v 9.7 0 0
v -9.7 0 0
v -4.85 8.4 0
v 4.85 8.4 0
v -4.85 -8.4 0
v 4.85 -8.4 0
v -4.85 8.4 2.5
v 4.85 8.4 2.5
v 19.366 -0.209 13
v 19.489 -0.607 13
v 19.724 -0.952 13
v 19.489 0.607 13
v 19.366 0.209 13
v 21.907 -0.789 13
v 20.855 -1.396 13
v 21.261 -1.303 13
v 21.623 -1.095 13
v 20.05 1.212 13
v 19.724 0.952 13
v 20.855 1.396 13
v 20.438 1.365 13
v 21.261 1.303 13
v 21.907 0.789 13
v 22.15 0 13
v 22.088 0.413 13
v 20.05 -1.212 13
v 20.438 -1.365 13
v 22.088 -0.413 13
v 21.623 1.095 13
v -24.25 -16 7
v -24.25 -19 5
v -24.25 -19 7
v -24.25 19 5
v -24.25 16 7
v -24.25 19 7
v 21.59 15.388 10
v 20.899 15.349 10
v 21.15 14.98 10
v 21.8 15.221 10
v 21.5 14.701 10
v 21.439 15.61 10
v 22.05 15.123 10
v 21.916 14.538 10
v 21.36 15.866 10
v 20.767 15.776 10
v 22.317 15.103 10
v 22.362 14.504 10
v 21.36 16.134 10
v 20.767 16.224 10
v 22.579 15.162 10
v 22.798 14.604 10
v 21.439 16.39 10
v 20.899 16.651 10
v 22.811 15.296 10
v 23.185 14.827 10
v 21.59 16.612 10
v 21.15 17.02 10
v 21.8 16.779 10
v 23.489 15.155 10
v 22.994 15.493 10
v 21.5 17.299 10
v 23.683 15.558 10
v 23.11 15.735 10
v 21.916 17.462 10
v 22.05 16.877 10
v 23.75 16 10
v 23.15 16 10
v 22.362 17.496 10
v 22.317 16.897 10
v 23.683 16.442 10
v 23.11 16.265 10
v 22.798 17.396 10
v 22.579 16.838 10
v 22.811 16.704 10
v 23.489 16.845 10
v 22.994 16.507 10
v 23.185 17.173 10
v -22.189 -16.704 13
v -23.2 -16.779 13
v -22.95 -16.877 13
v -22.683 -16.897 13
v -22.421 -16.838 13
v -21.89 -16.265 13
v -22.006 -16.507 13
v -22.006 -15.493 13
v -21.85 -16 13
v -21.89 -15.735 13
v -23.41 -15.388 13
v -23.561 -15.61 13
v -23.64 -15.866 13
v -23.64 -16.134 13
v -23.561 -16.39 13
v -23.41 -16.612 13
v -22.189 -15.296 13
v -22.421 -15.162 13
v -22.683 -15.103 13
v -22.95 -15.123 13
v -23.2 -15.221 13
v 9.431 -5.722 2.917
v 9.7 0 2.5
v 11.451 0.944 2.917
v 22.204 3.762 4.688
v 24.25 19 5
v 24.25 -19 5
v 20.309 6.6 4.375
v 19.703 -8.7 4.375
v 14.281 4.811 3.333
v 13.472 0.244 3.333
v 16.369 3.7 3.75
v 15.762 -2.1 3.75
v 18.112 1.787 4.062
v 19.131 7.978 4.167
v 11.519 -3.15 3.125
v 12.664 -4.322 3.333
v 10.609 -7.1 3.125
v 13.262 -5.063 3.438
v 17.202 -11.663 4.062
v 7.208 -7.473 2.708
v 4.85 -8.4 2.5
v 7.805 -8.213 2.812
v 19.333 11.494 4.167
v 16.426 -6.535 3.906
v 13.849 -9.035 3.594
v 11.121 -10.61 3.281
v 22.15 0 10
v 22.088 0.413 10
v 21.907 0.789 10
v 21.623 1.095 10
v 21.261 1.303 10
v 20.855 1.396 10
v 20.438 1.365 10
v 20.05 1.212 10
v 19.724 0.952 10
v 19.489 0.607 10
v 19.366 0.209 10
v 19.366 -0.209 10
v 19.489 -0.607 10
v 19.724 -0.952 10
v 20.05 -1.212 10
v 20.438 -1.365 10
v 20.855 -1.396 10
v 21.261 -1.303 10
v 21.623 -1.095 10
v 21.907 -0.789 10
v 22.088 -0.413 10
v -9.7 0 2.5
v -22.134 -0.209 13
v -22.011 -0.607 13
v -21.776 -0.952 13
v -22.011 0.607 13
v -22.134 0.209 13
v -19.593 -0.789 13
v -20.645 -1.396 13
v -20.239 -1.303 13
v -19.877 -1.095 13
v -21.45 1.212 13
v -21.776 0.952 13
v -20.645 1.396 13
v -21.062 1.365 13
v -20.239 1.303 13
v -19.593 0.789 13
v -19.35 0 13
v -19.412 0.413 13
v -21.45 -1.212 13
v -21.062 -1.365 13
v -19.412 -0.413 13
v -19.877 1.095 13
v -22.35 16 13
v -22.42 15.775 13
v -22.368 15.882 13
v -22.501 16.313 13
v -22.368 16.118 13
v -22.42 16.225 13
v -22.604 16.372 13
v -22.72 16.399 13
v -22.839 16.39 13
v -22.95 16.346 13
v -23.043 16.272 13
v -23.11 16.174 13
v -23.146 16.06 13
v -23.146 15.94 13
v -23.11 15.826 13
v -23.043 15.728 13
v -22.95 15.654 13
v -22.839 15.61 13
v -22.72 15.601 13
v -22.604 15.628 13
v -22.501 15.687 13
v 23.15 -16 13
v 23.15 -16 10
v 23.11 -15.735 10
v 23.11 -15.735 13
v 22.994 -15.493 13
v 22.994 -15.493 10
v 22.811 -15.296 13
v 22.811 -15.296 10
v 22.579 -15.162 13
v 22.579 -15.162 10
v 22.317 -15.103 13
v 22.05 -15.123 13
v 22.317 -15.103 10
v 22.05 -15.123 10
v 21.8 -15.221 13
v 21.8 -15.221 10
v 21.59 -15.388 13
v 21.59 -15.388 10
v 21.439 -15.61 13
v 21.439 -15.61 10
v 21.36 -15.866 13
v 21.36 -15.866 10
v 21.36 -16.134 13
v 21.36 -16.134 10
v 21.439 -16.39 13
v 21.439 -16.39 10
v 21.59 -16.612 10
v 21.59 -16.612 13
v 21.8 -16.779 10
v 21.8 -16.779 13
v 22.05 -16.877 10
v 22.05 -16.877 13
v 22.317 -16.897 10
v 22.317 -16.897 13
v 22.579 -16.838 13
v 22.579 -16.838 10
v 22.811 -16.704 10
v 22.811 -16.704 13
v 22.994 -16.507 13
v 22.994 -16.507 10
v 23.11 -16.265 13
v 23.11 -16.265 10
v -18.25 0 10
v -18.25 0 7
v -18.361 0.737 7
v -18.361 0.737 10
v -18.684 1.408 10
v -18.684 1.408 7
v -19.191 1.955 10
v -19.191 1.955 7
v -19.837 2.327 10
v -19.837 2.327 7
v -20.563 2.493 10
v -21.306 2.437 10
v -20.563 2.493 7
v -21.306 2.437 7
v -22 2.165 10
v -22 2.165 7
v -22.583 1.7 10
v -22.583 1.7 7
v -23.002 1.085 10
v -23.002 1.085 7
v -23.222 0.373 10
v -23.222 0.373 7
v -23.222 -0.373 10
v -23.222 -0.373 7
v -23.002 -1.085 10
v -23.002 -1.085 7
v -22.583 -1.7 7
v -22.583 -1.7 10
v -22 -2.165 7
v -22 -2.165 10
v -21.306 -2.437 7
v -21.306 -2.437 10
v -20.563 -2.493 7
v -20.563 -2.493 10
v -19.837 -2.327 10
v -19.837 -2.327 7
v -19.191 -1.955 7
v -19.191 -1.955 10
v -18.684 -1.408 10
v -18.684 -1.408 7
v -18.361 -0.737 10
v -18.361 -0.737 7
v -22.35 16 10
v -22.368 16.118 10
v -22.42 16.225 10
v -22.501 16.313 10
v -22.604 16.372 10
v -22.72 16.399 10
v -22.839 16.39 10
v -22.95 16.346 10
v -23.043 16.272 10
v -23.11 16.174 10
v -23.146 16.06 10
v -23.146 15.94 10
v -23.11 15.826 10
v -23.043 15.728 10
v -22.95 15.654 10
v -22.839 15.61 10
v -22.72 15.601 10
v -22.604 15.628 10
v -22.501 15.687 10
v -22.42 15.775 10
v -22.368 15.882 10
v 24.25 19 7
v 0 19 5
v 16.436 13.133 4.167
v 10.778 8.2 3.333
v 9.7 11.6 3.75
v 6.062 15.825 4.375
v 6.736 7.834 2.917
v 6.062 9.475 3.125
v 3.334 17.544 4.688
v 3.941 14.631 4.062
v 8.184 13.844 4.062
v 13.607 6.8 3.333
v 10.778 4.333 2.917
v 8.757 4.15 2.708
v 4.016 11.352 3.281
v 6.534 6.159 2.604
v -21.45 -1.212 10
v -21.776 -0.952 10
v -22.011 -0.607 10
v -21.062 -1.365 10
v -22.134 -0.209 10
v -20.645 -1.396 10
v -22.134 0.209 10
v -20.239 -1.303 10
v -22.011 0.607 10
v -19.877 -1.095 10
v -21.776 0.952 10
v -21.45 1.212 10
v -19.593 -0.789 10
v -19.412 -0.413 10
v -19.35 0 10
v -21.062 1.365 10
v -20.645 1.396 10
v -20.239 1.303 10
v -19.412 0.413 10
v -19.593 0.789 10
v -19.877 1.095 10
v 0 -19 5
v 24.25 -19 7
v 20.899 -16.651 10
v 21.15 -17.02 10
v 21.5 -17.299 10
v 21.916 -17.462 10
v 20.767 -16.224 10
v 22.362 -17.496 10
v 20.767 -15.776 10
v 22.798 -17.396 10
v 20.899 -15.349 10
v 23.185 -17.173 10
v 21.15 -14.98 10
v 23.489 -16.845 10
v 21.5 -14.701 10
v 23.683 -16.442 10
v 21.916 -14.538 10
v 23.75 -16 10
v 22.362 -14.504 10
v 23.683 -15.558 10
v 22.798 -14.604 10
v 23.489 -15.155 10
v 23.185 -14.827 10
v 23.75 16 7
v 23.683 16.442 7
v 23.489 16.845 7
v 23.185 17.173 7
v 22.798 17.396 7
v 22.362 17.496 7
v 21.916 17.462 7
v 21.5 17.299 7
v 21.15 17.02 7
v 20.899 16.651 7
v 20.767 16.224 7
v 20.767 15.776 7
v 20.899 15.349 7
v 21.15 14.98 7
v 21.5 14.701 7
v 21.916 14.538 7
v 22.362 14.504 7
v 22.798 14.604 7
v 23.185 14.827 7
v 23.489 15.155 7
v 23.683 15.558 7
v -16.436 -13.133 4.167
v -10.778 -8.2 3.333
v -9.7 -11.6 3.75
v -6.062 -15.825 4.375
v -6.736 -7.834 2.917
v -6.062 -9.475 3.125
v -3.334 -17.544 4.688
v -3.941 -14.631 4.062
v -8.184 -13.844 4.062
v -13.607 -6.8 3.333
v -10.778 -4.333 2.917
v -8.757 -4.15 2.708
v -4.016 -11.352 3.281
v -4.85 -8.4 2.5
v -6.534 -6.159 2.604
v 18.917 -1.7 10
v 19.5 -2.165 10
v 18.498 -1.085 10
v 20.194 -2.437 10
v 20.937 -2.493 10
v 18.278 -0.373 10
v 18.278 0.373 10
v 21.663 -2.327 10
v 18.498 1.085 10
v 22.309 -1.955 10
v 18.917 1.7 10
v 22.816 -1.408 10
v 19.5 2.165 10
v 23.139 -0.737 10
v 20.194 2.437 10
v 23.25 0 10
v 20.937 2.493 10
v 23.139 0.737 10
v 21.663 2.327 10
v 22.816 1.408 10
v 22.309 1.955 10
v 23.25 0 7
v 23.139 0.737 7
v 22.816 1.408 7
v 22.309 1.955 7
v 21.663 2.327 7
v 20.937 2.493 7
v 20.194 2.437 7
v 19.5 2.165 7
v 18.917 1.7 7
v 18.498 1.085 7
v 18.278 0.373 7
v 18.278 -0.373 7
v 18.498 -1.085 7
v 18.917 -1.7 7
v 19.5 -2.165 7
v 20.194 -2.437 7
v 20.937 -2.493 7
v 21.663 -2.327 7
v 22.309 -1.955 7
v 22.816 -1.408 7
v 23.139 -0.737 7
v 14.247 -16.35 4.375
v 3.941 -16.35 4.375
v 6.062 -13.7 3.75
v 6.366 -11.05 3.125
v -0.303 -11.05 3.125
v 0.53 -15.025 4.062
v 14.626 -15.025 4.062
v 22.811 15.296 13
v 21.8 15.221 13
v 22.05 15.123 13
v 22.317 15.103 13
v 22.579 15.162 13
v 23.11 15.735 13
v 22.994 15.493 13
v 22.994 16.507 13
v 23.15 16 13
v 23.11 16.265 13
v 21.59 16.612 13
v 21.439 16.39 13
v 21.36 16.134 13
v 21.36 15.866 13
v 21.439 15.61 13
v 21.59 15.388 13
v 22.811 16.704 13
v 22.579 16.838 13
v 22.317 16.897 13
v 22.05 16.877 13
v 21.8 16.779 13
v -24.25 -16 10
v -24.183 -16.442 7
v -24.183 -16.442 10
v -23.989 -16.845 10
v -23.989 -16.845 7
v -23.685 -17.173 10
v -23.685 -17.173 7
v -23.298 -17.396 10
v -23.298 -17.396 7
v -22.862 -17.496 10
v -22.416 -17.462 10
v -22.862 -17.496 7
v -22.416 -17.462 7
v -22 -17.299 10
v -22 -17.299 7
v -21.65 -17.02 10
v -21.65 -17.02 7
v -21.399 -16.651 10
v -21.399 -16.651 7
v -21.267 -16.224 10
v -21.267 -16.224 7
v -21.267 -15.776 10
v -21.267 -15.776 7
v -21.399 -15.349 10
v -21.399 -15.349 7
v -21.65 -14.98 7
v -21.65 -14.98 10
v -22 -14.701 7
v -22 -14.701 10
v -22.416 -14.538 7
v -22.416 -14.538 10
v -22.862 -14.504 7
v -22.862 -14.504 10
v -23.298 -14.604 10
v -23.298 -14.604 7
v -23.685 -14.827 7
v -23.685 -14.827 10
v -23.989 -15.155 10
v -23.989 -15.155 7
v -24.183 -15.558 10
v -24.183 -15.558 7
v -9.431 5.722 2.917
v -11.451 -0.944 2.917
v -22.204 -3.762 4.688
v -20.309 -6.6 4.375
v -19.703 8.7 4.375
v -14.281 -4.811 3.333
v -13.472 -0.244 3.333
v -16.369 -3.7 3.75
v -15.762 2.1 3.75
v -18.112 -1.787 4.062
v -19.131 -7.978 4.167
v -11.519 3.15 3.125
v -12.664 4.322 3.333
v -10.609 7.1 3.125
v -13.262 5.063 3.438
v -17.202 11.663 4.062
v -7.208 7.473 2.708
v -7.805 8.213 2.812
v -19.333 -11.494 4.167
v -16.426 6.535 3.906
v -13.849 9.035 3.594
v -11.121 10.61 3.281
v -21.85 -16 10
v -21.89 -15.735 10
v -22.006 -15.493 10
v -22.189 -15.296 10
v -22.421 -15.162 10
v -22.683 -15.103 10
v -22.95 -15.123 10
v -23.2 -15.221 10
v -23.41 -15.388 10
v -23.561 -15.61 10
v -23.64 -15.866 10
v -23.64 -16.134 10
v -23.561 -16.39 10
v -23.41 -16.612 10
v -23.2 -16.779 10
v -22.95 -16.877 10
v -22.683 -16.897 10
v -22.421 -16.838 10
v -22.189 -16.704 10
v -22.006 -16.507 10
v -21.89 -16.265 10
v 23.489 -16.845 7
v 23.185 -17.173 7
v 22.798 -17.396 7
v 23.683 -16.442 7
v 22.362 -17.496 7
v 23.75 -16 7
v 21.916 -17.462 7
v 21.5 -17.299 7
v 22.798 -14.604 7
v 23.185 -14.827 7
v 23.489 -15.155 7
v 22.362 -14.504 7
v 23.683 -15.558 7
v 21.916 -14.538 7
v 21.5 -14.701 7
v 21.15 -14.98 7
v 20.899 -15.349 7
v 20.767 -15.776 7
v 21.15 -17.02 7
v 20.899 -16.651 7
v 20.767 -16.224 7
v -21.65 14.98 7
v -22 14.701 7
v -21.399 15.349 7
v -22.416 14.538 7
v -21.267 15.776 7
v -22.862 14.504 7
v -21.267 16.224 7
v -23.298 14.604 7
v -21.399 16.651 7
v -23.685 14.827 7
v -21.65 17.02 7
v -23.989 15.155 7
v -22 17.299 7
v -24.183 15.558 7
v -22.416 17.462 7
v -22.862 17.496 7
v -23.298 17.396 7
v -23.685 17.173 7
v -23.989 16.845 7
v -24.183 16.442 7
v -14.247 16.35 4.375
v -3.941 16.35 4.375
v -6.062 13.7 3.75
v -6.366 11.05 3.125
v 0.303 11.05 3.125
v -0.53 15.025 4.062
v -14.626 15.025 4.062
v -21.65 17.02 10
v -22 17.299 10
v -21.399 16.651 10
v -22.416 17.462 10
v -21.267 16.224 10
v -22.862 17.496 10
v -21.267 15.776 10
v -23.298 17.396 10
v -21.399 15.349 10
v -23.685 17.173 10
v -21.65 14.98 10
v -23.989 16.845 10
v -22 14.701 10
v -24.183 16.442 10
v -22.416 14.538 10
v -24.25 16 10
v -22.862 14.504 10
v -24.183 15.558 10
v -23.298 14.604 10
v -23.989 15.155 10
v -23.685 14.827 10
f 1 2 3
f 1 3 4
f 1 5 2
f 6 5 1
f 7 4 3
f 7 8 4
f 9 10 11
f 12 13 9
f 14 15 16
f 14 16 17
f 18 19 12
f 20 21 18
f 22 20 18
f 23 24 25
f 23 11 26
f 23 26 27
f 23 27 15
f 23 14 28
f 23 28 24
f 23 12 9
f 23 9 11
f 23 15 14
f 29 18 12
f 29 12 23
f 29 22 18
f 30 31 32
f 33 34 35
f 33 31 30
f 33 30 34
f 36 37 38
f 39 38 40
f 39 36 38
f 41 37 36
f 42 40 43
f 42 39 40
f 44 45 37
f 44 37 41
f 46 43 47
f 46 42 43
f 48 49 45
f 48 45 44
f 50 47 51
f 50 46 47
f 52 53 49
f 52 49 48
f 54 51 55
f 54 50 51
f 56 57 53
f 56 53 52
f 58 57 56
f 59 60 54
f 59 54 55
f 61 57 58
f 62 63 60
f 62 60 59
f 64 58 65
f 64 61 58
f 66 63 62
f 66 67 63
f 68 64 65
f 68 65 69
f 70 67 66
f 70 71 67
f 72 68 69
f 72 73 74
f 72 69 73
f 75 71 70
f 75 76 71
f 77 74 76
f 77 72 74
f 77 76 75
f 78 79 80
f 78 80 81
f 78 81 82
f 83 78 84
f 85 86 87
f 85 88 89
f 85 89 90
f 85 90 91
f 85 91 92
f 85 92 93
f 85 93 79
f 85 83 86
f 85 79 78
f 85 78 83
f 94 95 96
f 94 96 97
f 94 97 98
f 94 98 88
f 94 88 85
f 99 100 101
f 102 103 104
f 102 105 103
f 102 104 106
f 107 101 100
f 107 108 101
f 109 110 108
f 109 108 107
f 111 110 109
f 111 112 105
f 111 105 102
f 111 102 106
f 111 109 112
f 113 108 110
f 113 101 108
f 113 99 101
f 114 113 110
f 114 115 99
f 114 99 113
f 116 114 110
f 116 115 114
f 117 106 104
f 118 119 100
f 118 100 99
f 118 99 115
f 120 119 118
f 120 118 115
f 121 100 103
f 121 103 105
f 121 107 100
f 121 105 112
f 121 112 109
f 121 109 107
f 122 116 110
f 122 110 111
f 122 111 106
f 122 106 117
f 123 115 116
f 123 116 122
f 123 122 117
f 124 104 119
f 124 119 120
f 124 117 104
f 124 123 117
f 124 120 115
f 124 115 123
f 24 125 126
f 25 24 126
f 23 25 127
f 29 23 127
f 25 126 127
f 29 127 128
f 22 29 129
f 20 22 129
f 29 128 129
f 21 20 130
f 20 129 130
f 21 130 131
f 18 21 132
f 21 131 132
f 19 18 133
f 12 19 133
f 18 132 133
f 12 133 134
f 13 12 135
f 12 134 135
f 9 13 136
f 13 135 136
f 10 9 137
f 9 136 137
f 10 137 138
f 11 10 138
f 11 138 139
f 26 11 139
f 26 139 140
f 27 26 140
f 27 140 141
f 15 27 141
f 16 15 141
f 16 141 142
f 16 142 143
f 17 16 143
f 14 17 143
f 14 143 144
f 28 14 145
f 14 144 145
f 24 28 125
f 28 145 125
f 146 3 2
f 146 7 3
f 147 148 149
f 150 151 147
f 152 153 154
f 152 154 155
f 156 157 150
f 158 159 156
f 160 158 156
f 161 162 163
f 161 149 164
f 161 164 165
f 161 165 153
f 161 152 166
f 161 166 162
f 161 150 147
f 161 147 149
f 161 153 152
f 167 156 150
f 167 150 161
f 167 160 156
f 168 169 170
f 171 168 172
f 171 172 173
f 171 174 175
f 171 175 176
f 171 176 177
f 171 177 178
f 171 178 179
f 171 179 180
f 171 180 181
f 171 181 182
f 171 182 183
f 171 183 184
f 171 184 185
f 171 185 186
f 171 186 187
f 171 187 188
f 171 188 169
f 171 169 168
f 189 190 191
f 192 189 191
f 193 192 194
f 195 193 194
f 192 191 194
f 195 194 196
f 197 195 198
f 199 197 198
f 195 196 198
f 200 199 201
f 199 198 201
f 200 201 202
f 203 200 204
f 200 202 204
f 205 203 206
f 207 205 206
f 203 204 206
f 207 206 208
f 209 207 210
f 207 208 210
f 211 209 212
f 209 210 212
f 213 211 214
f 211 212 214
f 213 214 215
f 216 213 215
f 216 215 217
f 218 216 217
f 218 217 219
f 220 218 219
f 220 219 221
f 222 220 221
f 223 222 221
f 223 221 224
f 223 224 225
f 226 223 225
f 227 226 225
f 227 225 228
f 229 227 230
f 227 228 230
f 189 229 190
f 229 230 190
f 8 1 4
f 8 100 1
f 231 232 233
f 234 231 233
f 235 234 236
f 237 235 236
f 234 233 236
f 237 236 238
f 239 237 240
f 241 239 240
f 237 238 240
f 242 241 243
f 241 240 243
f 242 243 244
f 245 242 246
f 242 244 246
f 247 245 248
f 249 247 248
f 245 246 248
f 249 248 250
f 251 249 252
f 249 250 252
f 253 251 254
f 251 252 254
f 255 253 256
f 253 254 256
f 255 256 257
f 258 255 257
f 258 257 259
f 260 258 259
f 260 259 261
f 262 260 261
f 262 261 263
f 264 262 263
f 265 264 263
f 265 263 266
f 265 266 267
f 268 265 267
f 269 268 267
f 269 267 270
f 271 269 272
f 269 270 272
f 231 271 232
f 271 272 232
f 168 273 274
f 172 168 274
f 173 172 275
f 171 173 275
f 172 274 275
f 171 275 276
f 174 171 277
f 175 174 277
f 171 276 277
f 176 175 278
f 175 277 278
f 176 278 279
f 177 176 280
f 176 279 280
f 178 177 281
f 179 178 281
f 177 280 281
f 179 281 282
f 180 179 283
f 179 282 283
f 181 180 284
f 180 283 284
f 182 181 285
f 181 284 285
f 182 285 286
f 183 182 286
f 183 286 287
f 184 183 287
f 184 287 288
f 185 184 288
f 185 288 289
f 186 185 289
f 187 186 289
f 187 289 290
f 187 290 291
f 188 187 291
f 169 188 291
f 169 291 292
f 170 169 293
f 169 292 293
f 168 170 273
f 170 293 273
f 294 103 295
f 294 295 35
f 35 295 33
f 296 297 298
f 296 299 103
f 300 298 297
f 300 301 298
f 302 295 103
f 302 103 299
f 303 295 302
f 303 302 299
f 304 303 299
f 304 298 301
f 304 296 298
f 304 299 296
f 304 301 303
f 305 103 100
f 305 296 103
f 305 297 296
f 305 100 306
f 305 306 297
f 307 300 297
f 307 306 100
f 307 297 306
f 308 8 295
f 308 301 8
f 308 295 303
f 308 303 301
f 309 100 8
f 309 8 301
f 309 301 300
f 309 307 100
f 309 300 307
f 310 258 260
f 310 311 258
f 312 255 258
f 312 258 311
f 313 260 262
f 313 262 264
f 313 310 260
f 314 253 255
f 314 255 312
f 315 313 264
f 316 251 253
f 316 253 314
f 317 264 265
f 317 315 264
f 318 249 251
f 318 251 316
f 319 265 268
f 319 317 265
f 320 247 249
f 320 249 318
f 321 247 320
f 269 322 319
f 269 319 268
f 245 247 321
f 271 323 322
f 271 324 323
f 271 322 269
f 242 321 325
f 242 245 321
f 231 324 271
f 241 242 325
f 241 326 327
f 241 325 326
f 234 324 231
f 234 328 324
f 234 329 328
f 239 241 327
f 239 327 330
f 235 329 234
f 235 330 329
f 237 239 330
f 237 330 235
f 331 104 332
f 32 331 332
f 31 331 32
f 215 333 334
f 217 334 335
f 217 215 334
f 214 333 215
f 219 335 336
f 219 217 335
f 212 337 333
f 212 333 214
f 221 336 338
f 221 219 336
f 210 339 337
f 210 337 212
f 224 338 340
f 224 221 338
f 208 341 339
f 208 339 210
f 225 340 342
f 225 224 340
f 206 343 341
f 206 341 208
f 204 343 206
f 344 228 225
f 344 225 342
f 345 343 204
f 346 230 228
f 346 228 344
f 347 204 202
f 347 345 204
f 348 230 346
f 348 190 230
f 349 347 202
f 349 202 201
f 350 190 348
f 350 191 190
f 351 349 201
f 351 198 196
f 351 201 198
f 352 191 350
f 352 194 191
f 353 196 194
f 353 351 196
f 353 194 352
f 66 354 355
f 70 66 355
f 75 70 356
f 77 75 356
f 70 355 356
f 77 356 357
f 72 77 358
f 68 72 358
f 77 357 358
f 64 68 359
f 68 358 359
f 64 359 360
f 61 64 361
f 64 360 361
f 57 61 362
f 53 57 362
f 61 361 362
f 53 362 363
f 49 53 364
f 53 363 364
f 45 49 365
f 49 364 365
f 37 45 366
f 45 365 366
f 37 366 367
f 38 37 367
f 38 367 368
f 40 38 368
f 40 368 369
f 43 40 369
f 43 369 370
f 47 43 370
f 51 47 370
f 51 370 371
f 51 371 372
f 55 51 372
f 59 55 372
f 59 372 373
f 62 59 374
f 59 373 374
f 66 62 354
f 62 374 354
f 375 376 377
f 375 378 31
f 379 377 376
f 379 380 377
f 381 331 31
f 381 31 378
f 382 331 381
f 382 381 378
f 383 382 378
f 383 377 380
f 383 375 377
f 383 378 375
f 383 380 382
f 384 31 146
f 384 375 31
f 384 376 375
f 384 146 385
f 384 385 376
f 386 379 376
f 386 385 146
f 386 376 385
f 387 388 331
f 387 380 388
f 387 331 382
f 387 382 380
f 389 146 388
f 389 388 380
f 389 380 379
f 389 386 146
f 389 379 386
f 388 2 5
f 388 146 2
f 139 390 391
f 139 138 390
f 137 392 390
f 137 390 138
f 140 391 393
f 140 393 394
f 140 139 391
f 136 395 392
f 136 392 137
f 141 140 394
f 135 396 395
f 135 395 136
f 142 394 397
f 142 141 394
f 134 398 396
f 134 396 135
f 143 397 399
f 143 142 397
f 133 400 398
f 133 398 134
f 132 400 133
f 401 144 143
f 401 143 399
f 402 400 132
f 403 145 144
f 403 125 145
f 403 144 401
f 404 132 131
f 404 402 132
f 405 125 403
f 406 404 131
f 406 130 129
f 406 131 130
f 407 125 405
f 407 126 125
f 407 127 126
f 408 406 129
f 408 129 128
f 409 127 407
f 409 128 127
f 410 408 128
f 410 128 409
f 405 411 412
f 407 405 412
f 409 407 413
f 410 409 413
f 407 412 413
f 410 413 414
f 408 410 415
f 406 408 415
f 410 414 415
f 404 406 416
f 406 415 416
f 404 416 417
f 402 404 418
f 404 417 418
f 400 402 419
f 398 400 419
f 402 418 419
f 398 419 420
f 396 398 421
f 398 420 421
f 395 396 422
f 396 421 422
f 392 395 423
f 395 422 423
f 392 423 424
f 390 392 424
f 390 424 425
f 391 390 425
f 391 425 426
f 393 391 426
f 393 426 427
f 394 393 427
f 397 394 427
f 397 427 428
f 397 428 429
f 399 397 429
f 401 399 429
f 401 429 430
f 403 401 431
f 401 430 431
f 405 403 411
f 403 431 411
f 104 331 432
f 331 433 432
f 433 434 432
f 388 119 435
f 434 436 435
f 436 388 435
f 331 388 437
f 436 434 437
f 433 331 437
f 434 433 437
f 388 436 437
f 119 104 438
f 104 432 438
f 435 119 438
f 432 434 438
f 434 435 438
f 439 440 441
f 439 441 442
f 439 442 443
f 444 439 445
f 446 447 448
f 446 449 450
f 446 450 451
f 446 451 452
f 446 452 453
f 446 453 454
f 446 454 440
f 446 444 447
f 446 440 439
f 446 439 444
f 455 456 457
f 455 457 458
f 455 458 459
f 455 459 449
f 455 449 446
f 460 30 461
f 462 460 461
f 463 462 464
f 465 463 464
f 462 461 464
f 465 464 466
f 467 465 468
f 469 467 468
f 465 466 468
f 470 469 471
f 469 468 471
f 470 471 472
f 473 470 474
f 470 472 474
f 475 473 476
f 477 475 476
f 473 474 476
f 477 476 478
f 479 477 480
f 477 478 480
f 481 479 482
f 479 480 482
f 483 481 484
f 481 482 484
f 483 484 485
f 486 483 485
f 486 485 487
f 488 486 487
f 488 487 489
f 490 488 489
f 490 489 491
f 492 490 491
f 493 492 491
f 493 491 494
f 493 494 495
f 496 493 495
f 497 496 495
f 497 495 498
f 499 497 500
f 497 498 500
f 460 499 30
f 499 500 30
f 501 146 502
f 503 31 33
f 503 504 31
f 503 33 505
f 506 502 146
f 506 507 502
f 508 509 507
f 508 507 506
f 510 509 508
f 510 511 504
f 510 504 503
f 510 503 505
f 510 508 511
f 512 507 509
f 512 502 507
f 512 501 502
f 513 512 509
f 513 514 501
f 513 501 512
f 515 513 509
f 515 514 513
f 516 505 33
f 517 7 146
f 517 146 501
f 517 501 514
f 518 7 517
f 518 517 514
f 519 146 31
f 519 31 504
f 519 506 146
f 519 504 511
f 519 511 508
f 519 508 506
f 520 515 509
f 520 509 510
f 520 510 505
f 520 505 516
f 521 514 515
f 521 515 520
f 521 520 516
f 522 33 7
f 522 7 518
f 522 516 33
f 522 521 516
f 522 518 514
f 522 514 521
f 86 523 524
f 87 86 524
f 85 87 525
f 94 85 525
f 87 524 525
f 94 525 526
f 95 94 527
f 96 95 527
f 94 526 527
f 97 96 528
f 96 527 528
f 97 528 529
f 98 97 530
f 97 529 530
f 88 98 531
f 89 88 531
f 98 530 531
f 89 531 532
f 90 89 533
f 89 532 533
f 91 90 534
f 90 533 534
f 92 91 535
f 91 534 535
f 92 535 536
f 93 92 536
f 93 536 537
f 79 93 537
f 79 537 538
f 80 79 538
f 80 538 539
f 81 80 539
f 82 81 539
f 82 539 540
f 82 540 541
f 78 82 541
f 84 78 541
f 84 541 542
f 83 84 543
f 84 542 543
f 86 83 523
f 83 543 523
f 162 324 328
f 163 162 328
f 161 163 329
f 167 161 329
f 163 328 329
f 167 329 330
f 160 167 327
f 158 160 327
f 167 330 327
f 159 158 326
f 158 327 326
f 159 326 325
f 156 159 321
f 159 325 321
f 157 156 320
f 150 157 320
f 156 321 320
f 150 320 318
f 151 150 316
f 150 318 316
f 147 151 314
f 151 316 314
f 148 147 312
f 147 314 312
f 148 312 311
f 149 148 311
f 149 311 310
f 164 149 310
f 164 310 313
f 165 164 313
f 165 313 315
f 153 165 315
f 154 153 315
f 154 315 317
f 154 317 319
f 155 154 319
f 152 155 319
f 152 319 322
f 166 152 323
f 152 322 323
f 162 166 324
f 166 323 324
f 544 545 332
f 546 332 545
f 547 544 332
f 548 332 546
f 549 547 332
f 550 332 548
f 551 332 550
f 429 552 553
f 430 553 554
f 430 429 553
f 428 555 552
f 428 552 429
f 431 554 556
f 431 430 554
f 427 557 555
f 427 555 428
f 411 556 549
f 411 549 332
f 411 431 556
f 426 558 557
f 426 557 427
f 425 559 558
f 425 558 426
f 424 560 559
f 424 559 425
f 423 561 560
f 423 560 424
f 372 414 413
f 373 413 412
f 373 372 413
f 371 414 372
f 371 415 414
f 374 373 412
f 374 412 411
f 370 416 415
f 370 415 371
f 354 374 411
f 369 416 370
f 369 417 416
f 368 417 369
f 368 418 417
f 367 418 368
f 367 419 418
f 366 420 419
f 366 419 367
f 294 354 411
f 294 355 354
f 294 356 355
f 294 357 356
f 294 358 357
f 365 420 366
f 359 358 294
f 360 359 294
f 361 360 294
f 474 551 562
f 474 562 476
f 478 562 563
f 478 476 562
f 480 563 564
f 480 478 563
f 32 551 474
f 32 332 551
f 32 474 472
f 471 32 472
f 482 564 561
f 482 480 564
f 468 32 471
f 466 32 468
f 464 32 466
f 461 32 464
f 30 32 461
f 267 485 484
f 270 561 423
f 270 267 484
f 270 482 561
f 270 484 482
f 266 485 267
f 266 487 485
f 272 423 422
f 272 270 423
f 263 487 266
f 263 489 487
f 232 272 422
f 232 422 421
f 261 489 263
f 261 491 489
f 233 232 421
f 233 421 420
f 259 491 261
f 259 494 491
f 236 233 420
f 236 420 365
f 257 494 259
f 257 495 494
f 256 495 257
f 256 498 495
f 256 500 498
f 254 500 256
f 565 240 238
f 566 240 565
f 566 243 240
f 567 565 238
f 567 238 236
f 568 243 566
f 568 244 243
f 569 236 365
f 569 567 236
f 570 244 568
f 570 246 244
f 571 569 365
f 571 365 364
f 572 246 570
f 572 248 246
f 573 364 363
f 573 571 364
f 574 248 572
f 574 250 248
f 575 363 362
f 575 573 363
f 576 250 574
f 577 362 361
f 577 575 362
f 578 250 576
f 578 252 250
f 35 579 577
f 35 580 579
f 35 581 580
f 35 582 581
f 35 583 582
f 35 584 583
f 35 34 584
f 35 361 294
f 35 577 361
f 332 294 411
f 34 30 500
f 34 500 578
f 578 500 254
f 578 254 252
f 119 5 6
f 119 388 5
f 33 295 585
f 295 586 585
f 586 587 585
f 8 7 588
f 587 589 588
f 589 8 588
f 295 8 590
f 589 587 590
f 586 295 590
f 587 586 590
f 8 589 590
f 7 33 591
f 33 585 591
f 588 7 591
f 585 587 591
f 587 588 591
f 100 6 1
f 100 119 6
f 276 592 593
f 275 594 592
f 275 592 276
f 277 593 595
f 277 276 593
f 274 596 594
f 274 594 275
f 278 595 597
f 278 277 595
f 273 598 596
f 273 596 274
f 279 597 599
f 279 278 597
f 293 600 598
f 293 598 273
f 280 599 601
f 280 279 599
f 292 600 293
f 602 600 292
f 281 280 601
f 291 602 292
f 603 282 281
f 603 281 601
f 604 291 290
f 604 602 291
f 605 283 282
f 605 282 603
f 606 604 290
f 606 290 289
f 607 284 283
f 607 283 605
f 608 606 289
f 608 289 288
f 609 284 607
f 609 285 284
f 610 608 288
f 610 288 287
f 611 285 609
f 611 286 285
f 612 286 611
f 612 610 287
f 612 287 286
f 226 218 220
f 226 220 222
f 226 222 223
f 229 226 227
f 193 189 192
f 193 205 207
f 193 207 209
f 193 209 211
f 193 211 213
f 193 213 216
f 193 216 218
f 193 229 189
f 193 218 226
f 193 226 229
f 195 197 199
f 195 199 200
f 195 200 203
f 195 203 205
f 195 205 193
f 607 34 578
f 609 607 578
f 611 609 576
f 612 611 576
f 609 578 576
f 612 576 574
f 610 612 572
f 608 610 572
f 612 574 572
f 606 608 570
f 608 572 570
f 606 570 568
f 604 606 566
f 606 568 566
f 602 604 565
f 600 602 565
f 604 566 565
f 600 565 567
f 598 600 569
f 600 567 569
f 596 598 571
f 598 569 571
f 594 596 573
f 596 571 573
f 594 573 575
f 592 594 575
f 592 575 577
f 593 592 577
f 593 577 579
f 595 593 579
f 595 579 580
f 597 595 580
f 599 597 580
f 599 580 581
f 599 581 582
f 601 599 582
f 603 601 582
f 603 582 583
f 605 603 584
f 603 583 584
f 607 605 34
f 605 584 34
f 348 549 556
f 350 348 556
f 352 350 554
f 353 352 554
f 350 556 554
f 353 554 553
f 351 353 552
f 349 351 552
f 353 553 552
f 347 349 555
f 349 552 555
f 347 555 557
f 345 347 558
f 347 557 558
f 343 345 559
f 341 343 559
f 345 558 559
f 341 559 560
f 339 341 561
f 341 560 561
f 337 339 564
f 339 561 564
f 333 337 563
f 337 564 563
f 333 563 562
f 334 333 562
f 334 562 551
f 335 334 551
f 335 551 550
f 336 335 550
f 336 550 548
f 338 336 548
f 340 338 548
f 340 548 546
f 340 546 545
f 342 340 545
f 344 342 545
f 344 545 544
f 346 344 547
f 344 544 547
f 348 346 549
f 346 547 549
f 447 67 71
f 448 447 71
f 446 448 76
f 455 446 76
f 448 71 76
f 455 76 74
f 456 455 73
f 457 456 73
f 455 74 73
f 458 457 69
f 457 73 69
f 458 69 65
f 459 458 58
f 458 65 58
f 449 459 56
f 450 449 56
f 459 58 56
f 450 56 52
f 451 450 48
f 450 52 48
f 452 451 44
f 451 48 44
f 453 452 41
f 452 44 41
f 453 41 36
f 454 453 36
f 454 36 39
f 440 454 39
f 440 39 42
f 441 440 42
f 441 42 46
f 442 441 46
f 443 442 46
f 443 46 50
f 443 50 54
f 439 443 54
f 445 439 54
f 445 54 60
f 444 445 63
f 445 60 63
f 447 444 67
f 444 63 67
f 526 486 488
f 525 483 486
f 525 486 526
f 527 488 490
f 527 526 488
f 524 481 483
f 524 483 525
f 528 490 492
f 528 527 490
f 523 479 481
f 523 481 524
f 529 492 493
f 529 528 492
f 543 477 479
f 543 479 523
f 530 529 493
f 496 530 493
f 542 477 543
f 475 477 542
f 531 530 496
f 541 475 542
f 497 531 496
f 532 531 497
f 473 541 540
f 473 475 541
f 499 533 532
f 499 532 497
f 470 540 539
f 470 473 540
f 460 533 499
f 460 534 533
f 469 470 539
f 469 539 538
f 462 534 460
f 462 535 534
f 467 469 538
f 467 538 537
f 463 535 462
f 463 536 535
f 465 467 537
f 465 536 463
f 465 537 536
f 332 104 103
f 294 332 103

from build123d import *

# Parameters (mm, degrees)
SKIZZE2_2_W                     = 38
SKIZZE2_2_H                     = 48.5
AUFSATZ_LINEAR_AUSTRAGEN1_DEPTH = 2
SKIZZE4_R                       = 2.5
SKIZZE4_R_2                     = 1.5
AUFSATZ_LINEAR_AUSTRAGEN2_DEPTH = 3
SKIZZE5_R                       = 0.4
SKIZZE5_R_2                     = 0.9
SKIZZE5_R_3                     = 1.4
AUFSATZ_LINEAR_AUSTRAGEN3_DEPTH = 3


with BuildPart() as part:
    # Skizze1 → Ausformung3 section 0
    with BuildSketch(Plane(origin=(0, 0, 0), x_dir=(0, 1, 0), z_dir=(0, 0, 1))):
        with BuildLine():
            Line((0, 9.7), (-8.400446417, 4.85))
            Line((-8.400446417, 4.85), (-8.400446417, -4.85))
            Line((-8.400446417, -4.85), (0, -9.7))
            Line((0, -9.7), (8.400446417, -4.85))
            Line((8.400446417, -4.85), (8.400446417, 4.85))
            Line((8.400446417, 4.85), (0, 9.7))
        make_face()
    # Skizze3 → Ausformung3 section 1
    with BuildSketch(Plane(origin=(0, 0, 2.5), x_dir=(0, 1, 0), z_dir=(0, 0, 1))):
        with BuildLine():
            Line((8.400446417, 4.85), (0, 9.7))
            Line((0, 9.7), (-8.400446417, 4.85))
            Line((-8.400446417, 4.85), (-8.400446417, -4.85))
            Line((-8.400446417, -4.85), (0, -9.7))
            Line((0, -9.7), (8.400446417, -4.85))
            Line((8.400446417, -4.85), (8.400446417, 4.85))
        make_face()
    loft()

    # Ausformung4: read off the stored shape, not the designer's step
    # Ausformung4: loft between two sections, ruled curve by curve
    ausformung4_from = [
        Edge.make_bspline([(24.25, 19, 5), (24.25, 12.666666667, 5), (24.25, 6.333333333, 5), (24.25, -6.333333333, 5), (24.25, -12.666666667, 5), (24.25, -19, 5)], [0, 0, 0, 0, 0.5, 0.5, 1, 1, 1, 1], 3),
        Edge.make_bspline([(0, -19, 5), (-4.041666667, -19, 5), (-8.083333333, -19, 5), (-16.166666667, -19, 5), (-20.208333333, -19, 5), (-24.25, -19, 5)], [0, 0, 0, 0, 0.5, 0.5, 1, 1, 1, 1], 3),
        Edge.make_bspline([(-24.25, -19, 5), (-24.25, -12.666666667, 5), (-24.25, -6.333333333, 5), (-24.25, 6.333333333, 5), (-24.25, 12.666666667, 5), (-24.25, 19, 5)], [0, 0, 0, 0, 0.5, 0.5, 1, 1, 1, 1], 3),
        Edge.make_bspline([(0, 19, 5), (4.041666667, 19, 5), (8.083333333, 19, 5), (16.166666667, 19, 5), (20.208333333, 19, 5), (24.25, 19, 5)], [0, 0, 0, 0, 0.5, 0.5, 1, 1, 1, 1], 3),
        Edge.make_line((0, -19, 5), (24.25, -19, 5)),
        Edge.make_line((0, 19, 5), (-24.25, 19, 5)),
    ]
    ausformung4_to = [
        Edge.make_bspline([(9.7, 0, 2.5), (8.891666667, -1.400074403, 2.5), (8.083333333, -2.800148806, 2.5), (6.466666667, -5.600297611, 2.5), (5.658333333, -7.000372014, 2.5), (4.85, -8.400446417, 2.5)], [0, 0, 0, 0, 0.5, 0.5, 1, 1, 1, 1], 3),
        Edge.make_bspline([(-4.85, -8.400446417, 2.5), (-5.658333333, -7.000372014, 2.5), (-6.466666667, -5.600297611, 2.5), (-8.083333333, -2.800148806, 2.5), (-8.891666667, -1.400074403, 2.5), (-9.7, 0, 2.5)], [0, 0, 0, 0, 0.5, 0.5, 1, 1, 1, 1], 3),
        Edge.make_bspline([(-9.7, 0, 2.5), (-8.891666667, 1.400074403, 2.5), (-8.083333333, 2.800148806, 2.5), (-6.466666667, 5.600297611, 2.5), (-5.658333333, 7.000372014, 2.5), (-4.85, 8.400446417, 2.5)], [0, 0, 0, 0, 0.5, 0.5, 1, 1, 1, 1], 3),
        Edge.make_bspline([(4.85, 8.400446417, 2.5), (5.658333333, 7.000372014, 2.5), (6.466666667, 5.600297611, 2.5), (8.083333333, 2.800148806, 2.5), (8.891666667, 1.400074403, 2.5), (9.7, 0, 2.5)], [0, 0, 0, 0, 0.5, 0.5, 1, 1, 1, 1], 3),
        Edge.make_line((-4.85, -8.400446417, 2.5), (4.85, -8.400446417, 2.5)),
        Edge.make_line((4.85, 8.400446417, 2.5), (-4.85, 8.400446417, 2.5)),
    ]
    ausformung4 = Solid(Shell([*[Face.make_surface_from_curves(ausformung4_from[k], ausformung4_to[k]) for k in range(6)], Face(Wire(ausformung4_from)), Face(Wire(ausformung4_to))]))
    add(ausformung4)

    # Skizze2<2> → Aufsatz-Linear austragen1 (add)
    with BuildSketch(Plane(origin=(0, 0, 5), x_dir=(0, 1, 0), z_dir=(0, 0, 1))):
        Rectangle(SKIZZE2_2_W, SKIZZE2_2_H)
    extrude(amount=AUFSATZ_LINEAR_AUSTRAGEN1_DEPTH)

    # Skizze4 → Aufsatz-Linear austragen2 (add)
    with BuildSketch(Plane.XY.offset(7)):
        with Locations((-20.75, 0)):
            Circle(SKIZZE4_R)
        with Locations((20.75, 0)):
            Circle(SKIZZE4_R)
        with Locations(Location((-22.75, 16, 0), (0, 0, 180))):
            Circle(SKIZZE4_R_2)
        with Locations(Location((-22.75, -16, 0), (0, 0, 180))):
            Circle(SKIZZE4_R_2)
        with Locations((22.25, 16)):
            Circle(SKIZZE4_R_2)
        with Locations((22.25, -16)):
            Circle(SKIZZE4_R_2)
    extrude(amount=AUFSATZ_LINEAR_AUSTRAGEN2_DEPTH)

    # Skizze5 → Aufsatz-Linear austragen3 (add)
    with BuildSketch(Plane.XY.offset(10)):
        with Locations((-22.75, 16)):
            Circle(SKIZZE5_R)
        with Locations((-22.75, -16)):
            Circle(SKIZZE5_R_2)
        with Locations((-20.75, 0)):
            Circle(SKIZZE5_R_3)
        with Locations((20.75, 0)):
            Circle(SKIZZE5_R_3)
        with Locations((22.25, 16)):
            Circle(SKIZZE5_R_2)
        with Locations((22.25, -16)):
            Circle(SKIZZE5_R_2)
    extrude(amount=AUFSATZ_LINEAR_AUSTRAGEN3_DEPTH)


solid = part.part
